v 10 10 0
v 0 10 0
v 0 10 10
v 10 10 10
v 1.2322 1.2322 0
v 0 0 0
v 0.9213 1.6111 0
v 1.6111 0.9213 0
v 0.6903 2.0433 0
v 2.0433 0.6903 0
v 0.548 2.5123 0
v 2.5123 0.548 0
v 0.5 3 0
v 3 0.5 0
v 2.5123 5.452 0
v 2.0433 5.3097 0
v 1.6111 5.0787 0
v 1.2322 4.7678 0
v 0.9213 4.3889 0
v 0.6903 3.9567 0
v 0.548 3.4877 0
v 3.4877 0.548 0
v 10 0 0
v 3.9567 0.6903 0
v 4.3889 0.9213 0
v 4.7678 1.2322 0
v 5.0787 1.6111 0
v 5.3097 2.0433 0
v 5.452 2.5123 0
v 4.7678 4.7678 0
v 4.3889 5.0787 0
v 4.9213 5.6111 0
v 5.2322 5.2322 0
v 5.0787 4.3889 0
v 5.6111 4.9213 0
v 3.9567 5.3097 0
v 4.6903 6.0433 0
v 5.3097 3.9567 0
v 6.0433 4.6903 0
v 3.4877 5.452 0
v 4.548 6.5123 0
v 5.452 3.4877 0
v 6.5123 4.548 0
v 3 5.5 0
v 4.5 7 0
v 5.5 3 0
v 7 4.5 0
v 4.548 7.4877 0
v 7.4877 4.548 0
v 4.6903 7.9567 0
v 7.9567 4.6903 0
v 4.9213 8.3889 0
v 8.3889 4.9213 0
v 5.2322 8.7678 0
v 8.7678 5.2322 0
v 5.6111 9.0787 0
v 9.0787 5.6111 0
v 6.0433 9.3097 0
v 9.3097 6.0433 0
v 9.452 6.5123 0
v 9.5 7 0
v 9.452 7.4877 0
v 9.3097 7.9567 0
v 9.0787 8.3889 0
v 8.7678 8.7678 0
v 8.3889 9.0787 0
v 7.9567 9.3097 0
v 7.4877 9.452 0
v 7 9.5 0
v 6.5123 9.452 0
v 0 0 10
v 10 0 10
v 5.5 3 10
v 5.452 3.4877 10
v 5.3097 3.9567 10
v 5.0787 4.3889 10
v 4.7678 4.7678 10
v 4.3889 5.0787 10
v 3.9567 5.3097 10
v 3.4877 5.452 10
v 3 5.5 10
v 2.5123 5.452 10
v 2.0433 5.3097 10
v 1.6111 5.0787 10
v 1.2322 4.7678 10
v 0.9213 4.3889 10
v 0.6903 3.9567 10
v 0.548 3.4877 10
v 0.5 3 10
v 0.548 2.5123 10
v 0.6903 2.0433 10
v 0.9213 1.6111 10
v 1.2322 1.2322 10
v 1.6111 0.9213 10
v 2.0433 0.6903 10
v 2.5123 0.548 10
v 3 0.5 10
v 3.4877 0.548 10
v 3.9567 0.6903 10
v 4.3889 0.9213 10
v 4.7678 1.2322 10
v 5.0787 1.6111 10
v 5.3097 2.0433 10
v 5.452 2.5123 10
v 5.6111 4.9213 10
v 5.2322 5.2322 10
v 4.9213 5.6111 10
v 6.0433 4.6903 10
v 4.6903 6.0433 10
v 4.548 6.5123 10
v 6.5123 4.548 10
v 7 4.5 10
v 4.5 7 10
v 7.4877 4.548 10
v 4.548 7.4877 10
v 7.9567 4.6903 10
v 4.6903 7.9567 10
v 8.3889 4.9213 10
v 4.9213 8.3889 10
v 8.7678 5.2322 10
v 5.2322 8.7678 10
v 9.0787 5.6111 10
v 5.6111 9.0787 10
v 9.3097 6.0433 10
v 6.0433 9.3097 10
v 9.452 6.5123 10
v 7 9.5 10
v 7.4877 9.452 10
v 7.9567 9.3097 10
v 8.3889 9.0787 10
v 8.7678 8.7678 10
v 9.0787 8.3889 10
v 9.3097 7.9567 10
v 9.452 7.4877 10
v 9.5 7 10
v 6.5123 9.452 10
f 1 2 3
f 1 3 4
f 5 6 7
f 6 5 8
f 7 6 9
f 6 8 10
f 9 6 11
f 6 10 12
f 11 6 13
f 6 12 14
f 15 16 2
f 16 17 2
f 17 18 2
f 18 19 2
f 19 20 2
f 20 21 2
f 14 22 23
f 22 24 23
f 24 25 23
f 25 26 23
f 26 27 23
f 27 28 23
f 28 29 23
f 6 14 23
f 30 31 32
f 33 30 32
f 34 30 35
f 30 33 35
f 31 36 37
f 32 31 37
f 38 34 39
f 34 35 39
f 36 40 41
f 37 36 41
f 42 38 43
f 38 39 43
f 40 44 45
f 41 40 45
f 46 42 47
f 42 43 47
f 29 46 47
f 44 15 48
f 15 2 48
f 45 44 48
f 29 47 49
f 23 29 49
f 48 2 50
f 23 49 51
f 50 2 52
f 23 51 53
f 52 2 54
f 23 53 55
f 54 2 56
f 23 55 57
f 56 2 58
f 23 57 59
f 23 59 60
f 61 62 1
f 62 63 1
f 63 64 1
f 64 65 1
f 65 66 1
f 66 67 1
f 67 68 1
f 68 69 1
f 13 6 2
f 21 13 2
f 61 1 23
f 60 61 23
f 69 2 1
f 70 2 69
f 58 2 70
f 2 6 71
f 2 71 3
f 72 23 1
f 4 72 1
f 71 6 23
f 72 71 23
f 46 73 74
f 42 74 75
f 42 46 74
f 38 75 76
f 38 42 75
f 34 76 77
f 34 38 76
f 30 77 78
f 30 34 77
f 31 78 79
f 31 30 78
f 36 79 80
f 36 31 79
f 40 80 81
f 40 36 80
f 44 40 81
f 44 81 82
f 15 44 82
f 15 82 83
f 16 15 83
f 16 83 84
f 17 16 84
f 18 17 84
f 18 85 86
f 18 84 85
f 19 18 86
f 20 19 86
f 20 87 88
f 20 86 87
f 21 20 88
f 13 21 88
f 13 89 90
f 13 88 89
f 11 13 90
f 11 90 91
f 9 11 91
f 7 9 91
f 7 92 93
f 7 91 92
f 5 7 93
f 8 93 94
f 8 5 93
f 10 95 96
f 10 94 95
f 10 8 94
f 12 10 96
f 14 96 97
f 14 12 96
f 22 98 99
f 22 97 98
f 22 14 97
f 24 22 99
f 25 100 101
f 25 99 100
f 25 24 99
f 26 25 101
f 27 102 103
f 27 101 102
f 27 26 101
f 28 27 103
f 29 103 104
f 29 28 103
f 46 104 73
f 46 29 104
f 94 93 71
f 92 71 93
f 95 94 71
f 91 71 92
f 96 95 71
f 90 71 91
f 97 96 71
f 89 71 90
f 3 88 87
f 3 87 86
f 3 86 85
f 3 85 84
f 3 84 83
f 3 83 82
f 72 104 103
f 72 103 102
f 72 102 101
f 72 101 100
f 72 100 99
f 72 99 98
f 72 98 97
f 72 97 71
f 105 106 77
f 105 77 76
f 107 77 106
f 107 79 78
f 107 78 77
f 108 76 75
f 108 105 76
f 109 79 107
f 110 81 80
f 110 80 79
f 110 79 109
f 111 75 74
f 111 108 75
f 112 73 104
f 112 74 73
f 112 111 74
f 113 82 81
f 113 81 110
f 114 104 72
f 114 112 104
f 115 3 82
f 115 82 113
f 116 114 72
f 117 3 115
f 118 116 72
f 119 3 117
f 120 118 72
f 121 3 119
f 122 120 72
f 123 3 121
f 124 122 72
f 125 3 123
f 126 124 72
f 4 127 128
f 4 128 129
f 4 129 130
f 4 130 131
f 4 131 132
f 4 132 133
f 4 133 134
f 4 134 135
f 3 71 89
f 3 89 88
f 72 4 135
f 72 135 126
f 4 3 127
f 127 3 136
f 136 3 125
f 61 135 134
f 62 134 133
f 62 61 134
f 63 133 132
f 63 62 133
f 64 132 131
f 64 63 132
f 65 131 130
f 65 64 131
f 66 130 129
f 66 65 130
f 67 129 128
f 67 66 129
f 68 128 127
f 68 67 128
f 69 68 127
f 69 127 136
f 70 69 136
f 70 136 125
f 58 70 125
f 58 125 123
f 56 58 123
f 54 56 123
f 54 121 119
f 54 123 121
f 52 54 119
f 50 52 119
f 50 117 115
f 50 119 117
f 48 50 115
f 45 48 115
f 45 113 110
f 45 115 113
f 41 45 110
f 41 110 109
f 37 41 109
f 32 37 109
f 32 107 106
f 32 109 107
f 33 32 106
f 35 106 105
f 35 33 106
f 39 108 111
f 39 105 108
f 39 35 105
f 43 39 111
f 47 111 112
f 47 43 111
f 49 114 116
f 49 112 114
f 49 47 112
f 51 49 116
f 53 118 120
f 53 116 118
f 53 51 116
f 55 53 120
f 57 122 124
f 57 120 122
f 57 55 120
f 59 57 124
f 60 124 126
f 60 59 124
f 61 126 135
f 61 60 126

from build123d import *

# Parameters (mm, degrees)
SKETCH1_W           = 10
SKETCH1_H           = 10
BOSS_EXTRUDE1_DEPTH = 10
SKETCH2_R           = 2.5
CUT_EXTRUDE1_DEPTH  = 18.320508076


with BuildPart() as part:
    # Sketch1 → Boss-Extrude1 (new body)
    with BuildSketch(Plane.XY):
        with Locations((5, 5)):
            Rectangle(SKETCH1_W, SKETCH1_H)
    extrude(amount=BOSS_EXTRUDE1_DEPTH)

    # Sketch2 → Cut-Extrude1 (cut, through all)
    with BuildSketch(Plane.XY):
        with Locations((3, 3)):
            Circle(SKETCH2_R)
        with Locations((7, 7)):
            Circle(SKETCH2_R)
    extrude(amount=CUT_EXTRUDE1_DEPTH, mode=Mode.SUBTRACT)


solid = part.part
